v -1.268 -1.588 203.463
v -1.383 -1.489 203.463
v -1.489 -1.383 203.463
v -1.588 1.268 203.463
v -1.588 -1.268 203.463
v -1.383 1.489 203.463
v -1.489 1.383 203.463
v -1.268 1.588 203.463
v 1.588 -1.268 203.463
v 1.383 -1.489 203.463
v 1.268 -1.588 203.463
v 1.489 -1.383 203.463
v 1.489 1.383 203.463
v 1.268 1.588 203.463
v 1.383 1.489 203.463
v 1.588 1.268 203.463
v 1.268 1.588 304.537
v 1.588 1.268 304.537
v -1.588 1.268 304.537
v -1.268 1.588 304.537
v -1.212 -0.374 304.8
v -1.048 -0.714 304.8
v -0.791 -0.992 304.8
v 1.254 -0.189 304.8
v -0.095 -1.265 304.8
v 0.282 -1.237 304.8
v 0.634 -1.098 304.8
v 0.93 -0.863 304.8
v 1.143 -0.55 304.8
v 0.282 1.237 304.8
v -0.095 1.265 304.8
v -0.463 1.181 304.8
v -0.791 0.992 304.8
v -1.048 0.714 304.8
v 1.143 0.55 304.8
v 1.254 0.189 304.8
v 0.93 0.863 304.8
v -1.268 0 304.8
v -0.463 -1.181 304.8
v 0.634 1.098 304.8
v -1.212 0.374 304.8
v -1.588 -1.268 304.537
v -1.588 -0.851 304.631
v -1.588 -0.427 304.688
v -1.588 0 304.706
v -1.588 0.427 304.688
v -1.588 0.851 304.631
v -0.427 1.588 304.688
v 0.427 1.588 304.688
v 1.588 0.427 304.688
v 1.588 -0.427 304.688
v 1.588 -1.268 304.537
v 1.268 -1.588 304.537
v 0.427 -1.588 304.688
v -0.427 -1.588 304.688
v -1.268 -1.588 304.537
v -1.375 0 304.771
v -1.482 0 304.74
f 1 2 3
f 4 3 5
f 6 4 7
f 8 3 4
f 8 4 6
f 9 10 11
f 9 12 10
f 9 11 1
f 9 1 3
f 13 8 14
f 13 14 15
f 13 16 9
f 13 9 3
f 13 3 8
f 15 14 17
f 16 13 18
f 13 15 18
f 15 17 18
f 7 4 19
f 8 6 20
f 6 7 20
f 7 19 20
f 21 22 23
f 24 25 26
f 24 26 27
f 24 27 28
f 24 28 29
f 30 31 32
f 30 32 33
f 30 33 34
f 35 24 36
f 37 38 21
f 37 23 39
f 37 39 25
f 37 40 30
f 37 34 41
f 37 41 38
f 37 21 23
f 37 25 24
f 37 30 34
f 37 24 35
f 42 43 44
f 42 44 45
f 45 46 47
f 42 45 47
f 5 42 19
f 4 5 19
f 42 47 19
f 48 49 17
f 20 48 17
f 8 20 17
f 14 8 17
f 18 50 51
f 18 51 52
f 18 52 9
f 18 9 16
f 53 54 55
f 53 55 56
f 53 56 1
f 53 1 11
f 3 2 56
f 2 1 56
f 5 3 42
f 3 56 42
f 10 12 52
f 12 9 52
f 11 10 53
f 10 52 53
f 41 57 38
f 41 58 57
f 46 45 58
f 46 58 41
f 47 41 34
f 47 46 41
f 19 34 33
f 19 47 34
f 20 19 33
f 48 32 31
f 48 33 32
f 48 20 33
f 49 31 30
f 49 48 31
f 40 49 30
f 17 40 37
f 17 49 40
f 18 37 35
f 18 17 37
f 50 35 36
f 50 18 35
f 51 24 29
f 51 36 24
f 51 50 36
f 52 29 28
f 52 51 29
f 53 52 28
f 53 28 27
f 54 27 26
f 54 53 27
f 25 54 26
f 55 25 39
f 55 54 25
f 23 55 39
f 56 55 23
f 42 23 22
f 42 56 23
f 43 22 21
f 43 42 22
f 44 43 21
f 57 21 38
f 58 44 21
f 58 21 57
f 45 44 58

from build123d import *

# Parameters (mm, degrees)
SKETCH1_W           = 3.175
SKETCH1_H           = 3.175
BOSS_EXTRUDE1_DEPTH = 152.4
SKETCH2_OUTSIDE_W   = 35.668
SKETCH2_OUTSIDE_H   = 35.668
SKETCH2_OUTSIDE_R   = 2.032
CUT_EXTRUDE1_DEPTH  = 153.4
CUT_EXTRUDE2_DEPTH  = 4.175


with BuildPart() as part:
    # Sketch1 → Boss-Extrude1 (new body)
    with BuildSketch(Plane.XY):
        Rectangle(SKETCH1_W, SKETCH1_H)
    extrude(amount=BOSS_EXTRUDE1_DEPTH)

    # Sketch2 outside → Cut-Extrude1 (cut, through all)
    with BuildSketch(Plane(origin=(0, 0, 0), x_dir=(-1, 0, 0), z_dir=(0, 0, -1))):
        Rectangle(SKETCH2_OUTSIDE_W, SKETCH2_OUTSIDE_H)
        Circle(SKETCH2_OUTSIDE_R, mode=Mode.SUBTRACT)
    extrude(amount=-CUT_EXTRUDE1_DEPTH, mode=Mode.SUBTRACT)

    # Sketch3 → Cut-Revolve1 (revolve, cut)
    with BuildSketch(Plane(origin=(0, 0, 0), x_dir=(1, 0, 0), z_dir=(0, 1, 0))):
        with BuildLine():
            Line((-5.053685963, -4.40273269), (-5.053685963, 5.740530545))
            Line((-5.053685963, 5.740530545), (0, 5.740530545))
            Line((0, 5.740530545), (0, 0.160877736))
            ThreePointArc((0, 0.160877736), (-3.404639553, -1.148866368), (-5.053685963, -4.40273269))
        make_face()
    revolve(axis=Axis((0, 0, 152.4), (0, 0, -1)), mode=Mode.SUBTRACT)

    # Mirror1: part across plane


with BuildPart() as part_1:
    add(part.part)
    add(part.part.mirror(Plane(origin=(0, 0, 152.4), x_dir=(1, 0, 0), z_dir=(0, 0, -1))))

    # Sketch4 → Cut-Extrude2 (cut, through all)
    with BuildSketch(Plane(origin=(1.5875, 0, 0), x_dir=(0, 0, -1), z_dir=(1, 0, 0))):
        Polygon((-0.263225358, -1.5875), (-203.463225358, -1.5875), (-203.463225358, 1.5875), (-0.263225358, 1.5875), (0.835678169, 1.5875), (0.835678169, -1.5875), align=None)
    extrude(amount=-CUT_EXTRUDE2_DEPTH, mode=Mode.SUBTRACT)


solid = part_1.part
